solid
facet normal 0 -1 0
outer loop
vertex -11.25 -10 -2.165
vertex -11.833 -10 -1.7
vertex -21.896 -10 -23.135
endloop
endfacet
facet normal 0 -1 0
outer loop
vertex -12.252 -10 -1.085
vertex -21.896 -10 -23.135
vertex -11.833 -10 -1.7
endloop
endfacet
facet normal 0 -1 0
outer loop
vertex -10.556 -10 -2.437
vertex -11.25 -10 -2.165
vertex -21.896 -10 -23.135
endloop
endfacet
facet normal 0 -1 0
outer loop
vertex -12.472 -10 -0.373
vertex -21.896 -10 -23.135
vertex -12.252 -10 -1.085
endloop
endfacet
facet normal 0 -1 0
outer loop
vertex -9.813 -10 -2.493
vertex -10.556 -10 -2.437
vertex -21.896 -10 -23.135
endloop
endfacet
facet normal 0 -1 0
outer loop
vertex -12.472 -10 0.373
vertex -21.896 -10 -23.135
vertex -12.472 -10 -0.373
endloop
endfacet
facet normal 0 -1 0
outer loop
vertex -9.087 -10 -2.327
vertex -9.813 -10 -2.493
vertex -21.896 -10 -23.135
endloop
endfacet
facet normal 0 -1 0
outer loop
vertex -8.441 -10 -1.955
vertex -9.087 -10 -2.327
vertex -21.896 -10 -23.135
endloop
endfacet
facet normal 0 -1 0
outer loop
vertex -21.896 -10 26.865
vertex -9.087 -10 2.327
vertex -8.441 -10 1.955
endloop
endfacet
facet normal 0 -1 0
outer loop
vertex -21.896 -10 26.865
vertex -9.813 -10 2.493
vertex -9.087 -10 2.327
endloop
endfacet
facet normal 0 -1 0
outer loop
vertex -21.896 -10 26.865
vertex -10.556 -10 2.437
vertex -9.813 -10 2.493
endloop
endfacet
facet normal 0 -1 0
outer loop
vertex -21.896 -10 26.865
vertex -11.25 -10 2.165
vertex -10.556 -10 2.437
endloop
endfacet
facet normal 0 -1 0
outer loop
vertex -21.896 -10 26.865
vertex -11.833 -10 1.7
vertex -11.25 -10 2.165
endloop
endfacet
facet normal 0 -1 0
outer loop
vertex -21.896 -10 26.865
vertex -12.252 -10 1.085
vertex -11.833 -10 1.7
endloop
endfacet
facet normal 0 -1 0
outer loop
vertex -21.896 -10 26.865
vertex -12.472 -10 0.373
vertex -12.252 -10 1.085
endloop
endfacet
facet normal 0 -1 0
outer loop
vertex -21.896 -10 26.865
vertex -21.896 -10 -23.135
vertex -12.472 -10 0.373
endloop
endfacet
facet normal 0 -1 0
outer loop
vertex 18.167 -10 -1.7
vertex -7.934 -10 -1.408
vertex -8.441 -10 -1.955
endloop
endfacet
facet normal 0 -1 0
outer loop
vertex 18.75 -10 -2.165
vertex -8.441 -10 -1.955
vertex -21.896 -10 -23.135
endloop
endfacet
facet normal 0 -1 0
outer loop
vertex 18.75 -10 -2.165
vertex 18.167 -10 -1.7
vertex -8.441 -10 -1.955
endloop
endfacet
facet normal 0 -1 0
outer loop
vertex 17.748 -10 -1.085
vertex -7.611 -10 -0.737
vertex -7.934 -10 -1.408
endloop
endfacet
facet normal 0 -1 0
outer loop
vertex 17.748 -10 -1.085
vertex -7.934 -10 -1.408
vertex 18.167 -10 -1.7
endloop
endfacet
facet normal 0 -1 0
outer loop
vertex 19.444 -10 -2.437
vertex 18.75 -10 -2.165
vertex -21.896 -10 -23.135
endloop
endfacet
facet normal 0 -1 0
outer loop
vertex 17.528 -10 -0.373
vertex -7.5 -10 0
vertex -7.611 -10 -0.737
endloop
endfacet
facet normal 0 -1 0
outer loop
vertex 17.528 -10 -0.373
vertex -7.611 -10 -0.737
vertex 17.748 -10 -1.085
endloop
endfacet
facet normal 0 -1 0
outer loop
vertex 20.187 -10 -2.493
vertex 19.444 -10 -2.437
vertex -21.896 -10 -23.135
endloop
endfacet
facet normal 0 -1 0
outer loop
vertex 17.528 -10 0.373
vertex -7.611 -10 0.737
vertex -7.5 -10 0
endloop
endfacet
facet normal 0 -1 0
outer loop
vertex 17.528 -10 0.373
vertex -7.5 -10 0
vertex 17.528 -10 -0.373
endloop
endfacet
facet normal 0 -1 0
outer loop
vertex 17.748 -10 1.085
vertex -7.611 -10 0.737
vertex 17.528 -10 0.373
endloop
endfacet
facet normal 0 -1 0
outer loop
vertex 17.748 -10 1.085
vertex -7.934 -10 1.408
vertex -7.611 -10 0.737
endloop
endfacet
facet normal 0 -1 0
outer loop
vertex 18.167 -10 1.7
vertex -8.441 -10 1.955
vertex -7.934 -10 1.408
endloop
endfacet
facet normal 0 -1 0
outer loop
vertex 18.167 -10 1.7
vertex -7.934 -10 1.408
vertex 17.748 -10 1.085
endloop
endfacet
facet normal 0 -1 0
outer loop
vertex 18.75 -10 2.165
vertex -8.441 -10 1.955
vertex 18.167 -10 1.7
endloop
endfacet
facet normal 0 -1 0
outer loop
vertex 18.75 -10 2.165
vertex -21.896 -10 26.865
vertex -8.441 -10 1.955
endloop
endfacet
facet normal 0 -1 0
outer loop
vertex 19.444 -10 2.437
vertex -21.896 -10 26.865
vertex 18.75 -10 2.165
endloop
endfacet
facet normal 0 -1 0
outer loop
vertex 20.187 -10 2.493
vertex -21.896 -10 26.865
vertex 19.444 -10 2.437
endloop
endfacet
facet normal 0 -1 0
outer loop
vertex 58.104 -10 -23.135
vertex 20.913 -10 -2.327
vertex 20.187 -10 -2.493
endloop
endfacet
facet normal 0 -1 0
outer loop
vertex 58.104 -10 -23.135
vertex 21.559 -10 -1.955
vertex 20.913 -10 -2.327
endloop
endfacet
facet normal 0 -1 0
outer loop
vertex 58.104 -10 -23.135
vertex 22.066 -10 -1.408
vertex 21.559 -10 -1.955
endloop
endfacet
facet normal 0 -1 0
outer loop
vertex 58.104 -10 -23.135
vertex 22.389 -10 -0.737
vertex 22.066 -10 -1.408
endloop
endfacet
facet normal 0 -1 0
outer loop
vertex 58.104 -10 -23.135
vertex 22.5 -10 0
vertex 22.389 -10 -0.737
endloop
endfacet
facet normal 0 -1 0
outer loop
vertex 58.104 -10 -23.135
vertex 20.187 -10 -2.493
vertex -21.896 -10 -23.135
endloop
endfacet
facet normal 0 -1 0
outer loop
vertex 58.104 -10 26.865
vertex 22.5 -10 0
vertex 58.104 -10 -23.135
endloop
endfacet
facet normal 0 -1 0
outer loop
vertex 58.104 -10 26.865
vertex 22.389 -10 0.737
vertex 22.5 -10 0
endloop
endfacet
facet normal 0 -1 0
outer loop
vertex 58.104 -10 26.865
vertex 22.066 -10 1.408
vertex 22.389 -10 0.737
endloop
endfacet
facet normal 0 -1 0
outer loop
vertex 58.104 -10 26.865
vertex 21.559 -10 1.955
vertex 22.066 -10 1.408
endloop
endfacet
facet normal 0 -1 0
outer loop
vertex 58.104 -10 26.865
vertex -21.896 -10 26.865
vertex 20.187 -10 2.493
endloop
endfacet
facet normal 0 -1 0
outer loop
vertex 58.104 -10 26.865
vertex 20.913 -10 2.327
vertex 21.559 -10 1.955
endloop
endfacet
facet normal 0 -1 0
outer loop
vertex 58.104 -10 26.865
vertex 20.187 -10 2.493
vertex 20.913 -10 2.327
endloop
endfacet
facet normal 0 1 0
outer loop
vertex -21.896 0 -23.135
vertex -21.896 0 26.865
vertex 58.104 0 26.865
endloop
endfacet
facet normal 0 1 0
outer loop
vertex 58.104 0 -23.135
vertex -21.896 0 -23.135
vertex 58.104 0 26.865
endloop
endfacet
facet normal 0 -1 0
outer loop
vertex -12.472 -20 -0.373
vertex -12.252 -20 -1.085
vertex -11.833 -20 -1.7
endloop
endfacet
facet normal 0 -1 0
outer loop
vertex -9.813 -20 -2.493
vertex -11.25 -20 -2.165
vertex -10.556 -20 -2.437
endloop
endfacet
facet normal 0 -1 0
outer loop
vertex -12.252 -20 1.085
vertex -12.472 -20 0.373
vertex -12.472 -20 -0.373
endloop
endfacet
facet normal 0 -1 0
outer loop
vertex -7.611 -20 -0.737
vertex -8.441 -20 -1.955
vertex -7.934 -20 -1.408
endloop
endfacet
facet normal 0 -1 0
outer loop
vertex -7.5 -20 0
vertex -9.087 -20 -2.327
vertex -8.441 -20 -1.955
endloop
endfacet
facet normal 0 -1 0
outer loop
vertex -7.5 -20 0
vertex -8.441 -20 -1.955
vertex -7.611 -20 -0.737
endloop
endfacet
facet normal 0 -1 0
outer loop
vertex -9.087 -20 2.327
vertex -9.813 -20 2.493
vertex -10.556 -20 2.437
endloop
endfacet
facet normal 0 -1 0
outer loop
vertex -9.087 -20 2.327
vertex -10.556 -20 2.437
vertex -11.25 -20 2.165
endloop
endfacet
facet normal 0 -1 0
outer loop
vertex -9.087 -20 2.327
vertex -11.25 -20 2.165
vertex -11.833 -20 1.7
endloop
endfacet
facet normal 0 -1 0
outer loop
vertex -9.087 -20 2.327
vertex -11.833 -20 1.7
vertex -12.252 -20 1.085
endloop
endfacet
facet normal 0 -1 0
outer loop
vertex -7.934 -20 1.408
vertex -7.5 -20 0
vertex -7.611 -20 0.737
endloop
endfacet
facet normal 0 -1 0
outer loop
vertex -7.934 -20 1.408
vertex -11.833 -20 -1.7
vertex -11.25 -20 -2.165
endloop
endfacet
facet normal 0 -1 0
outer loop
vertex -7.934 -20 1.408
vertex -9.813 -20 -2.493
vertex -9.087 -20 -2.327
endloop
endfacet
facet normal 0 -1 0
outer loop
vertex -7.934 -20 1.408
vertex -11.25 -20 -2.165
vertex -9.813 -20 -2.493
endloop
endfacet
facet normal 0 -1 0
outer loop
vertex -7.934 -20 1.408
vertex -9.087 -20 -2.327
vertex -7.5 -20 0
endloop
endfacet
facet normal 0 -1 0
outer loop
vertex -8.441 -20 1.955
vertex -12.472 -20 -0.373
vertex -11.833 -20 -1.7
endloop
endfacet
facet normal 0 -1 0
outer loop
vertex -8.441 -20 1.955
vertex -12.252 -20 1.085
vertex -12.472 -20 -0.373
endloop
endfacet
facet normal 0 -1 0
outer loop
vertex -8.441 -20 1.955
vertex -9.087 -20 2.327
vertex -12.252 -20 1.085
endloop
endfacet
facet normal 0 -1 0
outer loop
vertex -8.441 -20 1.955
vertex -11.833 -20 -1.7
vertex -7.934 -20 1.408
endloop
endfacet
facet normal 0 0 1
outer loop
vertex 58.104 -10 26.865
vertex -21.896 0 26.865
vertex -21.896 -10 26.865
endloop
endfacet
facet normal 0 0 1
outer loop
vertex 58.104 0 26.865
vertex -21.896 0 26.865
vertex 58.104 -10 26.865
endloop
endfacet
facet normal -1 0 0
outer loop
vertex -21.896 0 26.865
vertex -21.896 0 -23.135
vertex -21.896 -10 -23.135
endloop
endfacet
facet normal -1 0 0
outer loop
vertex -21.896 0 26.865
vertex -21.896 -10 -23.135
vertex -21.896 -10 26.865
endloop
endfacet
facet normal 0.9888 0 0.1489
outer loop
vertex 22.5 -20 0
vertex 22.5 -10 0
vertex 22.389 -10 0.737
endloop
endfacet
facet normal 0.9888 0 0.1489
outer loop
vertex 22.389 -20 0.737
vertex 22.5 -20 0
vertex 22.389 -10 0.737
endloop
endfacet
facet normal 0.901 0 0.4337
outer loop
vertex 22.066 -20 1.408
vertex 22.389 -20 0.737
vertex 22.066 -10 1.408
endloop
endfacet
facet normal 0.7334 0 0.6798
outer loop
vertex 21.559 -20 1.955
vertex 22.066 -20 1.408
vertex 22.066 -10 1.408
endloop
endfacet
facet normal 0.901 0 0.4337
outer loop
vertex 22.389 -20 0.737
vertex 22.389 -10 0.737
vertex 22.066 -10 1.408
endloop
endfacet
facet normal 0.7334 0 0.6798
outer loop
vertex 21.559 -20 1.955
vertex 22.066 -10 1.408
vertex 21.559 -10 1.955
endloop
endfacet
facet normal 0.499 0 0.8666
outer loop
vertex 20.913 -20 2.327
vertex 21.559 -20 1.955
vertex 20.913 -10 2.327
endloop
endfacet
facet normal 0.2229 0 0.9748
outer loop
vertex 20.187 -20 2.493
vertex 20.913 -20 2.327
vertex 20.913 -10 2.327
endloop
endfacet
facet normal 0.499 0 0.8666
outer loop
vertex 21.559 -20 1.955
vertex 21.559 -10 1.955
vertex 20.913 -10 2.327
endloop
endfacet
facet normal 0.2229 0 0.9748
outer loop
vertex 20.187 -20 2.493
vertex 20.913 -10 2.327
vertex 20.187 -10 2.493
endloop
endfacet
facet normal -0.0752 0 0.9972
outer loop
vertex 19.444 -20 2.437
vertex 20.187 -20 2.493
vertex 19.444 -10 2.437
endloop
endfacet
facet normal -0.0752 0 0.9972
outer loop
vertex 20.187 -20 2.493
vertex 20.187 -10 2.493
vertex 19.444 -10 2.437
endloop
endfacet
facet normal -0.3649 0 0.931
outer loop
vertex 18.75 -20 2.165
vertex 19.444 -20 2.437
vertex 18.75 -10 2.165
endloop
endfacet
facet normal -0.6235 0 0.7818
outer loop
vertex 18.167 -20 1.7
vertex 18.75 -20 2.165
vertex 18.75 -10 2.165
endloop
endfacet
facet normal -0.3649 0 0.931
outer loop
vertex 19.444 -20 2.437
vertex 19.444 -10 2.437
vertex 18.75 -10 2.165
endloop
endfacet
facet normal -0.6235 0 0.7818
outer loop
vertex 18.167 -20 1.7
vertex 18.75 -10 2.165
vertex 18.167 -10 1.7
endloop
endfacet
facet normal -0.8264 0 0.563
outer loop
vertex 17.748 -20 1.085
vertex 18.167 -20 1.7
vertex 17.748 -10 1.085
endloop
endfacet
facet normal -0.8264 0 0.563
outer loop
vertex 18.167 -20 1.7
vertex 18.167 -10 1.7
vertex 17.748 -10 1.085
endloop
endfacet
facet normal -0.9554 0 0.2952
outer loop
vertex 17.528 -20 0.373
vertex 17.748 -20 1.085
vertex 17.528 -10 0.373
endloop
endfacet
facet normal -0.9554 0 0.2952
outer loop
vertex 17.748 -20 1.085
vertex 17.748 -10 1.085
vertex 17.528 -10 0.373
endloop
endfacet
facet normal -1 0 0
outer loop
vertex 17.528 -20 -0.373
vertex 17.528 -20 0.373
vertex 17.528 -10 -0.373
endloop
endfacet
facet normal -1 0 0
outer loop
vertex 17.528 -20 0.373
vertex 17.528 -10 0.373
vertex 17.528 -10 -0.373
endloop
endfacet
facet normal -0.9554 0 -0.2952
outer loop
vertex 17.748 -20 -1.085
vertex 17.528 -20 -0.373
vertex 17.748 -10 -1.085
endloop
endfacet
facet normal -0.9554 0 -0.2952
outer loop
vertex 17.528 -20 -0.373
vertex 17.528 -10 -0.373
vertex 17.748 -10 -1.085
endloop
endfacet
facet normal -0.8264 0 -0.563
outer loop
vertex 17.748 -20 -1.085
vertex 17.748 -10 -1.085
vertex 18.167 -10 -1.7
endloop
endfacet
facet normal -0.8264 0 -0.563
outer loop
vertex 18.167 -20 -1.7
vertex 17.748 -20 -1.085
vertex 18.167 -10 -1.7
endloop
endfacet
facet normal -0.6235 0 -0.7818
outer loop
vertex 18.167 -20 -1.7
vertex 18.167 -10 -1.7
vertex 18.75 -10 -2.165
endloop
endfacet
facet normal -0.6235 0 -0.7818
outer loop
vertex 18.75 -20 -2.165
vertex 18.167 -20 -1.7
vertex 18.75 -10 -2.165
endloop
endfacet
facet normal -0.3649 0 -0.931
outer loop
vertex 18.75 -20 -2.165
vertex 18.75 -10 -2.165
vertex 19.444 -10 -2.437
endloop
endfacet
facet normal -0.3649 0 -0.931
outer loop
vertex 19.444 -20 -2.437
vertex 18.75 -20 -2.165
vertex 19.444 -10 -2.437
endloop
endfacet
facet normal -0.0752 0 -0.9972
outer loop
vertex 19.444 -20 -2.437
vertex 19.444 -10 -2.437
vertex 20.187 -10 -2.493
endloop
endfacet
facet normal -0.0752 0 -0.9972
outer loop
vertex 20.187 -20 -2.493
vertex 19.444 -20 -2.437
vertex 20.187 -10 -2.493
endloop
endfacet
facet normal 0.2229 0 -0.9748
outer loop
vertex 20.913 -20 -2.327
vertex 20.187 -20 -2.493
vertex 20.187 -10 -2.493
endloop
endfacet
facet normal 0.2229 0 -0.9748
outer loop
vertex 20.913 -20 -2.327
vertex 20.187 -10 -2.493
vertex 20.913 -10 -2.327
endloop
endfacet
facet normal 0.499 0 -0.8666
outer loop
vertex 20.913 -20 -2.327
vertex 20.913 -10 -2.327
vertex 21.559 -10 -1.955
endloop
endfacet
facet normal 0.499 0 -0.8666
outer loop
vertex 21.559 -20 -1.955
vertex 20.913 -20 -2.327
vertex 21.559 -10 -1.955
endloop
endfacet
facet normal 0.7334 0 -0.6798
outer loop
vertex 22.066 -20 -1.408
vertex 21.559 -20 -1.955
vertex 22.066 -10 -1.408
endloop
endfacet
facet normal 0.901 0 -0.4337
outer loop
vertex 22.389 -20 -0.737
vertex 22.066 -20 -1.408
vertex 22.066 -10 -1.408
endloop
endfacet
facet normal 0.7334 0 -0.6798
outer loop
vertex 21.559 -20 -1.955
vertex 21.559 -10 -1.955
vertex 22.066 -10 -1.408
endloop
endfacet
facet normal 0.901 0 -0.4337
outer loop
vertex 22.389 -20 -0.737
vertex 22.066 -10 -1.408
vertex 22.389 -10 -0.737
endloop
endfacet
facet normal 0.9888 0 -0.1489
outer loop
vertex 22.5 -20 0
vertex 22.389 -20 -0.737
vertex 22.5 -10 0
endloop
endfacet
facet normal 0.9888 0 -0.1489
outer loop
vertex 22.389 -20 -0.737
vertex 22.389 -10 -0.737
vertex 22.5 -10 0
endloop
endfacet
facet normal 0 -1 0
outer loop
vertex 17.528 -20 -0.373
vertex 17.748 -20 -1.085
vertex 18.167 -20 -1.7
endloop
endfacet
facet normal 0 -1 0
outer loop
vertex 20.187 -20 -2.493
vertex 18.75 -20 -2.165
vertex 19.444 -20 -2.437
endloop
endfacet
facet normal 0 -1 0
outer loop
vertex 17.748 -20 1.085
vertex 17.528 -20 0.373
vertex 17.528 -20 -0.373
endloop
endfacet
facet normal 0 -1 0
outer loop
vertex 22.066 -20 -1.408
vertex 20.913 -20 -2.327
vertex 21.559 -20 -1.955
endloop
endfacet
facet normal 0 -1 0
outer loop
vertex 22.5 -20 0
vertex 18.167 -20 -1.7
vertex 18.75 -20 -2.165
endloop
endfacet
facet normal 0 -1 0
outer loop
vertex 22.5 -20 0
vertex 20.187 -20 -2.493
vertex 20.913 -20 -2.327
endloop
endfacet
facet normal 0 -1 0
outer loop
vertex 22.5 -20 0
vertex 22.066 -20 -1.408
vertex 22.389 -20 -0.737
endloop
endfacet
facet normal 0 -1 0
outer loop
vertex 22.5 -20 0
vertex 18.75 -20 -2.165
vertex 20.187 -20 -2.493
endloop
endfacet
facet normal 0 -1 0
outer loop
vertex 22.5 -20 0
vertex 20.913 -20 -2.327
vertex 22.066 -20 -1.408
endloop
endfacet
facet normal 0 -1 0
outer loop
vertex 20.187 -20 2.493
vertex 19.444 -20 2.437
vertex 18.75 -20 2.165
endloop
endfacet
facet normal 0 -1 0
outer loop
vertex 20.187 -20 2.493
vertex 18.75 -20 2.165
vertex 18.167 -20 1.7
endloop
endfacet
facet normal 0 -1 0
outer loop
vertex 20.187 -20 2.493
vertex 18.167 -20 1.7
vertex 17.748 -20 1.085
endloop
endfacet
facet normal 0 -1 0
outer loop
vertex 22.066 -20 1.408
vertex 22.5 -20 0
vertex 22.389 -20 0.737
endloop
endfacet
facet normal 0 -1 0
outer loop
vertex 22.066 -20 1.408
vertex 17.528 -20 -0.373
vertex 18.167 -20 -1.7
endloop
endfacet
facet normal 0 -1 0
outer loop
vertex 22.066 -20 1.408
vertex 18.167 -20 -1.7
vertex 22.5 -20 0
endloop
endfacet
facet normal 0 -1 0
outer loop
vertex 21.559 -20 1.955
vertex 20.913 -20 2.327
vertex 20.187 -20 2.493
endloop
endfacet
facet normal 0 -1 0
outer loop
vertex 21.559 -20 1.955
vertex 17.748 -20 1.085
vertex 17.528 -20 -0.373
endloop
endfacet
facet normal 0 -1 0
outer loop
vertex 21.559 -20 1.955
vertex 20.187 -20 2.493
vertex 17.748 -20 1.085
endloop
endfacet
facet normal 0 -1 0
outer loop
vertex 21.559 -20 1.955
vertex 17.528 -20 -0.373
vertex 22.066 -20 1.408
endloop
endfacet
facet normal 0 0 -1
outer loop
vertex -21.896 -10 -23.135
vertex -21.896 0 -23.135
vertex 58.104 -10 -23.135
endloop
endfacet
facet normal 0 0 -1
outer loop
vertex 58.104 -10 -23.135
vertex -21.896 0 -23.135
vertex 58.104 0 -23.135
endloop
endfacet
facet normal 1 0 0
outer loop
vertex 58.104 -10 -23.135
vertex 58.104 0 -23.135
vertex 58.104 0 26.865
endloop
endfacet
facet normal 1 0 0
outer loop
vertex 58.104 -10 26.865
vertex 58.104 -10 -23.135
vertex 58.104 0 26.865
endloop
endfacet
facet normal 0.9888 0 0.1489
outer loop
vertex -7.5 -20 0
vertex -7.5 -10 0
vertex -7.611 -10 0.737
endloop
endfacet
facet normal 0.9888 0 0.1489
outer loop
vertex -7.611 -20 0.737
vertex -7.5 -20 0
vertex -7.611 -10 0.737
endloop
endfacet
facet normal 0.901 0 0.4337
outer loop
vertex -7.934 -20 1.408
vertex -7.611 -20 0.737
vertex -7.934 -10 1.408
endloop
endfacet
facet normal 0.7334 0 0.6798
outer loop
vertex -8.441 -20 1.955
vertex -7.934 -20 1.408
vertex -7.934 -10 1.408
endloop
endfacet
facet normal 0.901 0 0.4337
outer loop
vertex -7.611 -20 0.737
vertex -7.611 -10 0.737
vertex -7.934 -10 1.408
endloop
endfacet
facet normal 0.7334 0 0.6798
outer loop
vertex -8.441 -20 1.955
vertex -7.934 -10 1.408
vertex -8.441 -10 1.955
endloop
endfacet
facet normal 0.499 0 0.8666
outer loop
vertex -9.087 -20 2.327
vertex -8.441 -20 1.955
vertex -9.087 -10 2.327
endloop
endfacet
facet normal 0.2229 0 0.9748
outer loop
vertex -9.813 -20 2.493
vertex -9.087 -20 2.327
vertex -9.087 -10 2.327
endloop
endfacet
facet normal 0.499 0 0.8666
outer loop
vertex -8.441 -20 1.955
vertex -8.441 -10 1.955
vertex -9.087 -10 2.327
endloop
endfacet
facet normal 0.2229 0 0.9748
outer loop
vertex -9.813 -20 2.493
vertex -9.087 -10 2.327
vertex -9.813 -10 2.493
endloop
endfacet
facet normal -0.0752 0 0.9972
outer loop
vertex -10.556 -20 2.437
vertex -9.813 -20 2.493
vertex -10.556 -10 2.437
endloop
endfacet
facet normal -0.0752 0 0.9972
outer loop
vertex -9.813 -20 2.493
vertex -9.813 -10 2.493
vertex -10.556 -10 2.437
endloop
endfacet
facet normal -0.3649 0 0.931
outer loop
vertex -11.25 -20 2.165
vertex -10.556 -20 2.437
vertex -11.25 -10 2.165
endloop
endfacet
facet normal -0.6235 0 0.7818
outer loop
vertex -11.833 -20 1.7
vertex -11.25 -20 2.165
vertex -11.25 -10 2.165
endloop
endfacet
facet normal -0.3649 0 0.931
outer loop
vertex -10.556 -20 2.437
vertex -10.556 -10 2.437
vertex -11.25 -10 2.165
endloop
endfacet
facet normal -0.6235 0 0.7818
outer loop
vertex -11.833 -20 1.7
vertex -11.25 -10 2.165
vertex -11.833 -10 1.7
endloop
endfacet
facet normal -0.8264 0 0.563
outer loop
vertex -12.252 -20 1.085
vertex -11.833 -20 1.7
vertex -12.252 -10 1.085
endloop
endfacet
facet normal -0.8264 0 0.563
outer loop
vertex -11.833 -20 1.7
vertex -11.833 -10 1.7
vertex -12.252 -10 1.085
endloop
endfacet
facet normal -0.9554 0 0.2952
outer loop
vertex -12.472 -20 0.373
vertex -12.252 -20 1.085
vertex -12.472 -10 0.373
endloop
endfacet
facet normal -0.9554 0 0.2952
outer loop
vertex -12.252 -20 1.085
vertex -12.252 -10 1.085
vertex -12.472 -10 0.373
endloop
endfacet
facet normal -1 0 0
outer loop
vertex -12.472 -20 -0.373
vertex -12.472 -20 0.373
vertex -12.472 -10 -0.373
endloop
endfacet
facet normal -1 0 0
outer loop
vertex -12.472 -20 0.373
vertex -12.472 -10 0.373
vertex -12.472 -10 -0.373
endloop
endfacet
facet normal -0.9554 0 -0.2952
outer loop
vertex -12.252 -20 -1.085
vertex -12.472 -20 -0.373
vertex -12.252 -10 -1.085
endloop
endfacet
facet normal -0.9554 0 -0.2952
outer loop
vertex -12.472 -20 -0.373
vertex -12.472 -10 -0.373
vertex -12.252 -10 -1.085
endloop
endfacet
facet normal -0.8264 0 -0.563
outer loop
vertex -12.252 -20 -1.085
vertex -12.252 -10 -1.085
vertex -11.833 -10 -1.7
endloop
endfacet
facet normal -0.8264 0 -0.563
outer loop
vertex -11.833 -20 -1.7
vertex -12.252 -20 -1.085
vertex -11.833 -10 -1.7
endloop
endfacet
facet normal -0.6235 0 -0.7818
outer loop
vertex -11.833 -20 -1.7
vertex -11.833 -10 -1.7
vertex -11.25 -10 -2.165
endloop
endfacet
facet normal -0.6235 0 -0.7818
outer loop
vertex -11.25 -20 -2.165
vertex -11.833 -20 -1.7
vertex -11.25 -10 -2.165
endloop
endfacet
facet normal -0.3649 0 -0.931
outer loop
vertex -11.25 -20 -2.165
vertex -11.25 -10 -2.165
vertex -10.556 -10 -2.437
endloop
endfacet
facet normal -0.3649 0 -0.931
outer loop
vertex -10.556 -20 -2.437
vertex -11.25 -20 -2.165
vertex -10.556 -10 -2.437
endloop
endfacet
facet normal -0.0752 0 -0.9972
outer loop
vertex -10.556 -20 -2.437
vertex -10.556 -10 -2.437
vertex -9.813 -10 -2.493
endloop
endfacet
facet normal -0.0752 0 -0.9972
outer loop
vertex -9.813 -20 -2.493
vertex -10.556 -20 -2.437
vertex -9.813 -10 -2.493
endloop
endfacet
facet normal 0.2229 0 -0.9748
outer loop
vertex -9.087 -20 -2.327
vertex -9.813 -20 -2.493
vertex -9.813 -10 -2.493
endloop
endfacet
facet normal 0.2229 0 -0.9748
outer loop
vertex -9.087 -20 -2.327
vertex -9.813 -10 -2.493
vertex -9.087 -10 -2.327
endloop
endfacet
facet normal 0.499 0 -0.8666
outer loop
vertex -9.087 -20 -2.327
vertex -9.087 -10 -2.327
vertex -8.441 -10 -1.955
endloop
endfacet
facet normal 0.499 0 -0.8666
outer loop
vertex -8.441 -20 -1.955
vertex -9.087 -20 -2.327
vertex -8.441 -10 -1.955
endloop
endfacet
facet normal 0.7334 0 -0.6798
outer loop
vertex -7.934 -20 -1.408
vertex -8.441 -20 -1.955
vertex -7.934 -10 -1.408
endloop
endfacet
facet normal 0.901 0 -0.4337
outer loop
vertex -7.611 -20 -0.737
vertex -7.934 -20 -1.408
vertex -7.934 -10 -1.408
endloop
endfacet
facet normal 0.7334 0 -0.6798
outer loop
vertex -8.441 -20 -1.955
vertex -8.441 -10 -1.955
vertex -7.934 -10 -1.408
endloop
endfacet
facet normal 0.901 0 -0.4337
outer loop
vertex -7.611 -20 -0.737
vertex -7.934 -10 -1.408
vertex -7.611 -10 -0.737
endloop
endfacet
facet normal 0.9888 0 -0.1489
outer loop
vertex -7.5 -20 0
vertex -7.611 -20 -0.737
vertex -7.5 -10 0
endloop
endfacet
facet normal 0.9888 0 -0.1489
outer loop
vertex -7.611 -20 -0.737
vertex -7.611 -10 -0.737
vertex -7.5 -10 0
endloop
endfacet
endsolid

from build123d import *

# Parameters (mm, degrees)
F0_W     = 80
F0_H     = 50
F1_DEPTH = 10
F2_R     = 2.5
F3_DEPTH = 10
F5_DEPTH = 10


with BuildPart() as f1:
    # F0 (on Front) → F1 (new body)
    with BuildSketch(Plane.XZ):
        with Locations((18.104014, 1.864604)):
            Rectangle(F0_W, F0_H)
    extrude(amount=F1_DEPTH)

    # F2 (on face) → F3 (join)
    with BuildSketch(Plane.XZ.offset(10)):
        with Locations((-10, 0)):
            Circle(F2_R)
    extrude(amount=F3_DEPTH)

    # F4 (on face) → F5 (join)
    with BuildSketch(Plane.XZ.offset(10)):
        with BuildLine():
            ThreePointArc((17.5, 0), (20, -2.5), (22.5, 0))
            ThreePointArc((22.5, 0), (20, 2.5), (17.5, 0))
        make_face()
    extrude(amount=F5_DEPTH)


solid = f1.part
